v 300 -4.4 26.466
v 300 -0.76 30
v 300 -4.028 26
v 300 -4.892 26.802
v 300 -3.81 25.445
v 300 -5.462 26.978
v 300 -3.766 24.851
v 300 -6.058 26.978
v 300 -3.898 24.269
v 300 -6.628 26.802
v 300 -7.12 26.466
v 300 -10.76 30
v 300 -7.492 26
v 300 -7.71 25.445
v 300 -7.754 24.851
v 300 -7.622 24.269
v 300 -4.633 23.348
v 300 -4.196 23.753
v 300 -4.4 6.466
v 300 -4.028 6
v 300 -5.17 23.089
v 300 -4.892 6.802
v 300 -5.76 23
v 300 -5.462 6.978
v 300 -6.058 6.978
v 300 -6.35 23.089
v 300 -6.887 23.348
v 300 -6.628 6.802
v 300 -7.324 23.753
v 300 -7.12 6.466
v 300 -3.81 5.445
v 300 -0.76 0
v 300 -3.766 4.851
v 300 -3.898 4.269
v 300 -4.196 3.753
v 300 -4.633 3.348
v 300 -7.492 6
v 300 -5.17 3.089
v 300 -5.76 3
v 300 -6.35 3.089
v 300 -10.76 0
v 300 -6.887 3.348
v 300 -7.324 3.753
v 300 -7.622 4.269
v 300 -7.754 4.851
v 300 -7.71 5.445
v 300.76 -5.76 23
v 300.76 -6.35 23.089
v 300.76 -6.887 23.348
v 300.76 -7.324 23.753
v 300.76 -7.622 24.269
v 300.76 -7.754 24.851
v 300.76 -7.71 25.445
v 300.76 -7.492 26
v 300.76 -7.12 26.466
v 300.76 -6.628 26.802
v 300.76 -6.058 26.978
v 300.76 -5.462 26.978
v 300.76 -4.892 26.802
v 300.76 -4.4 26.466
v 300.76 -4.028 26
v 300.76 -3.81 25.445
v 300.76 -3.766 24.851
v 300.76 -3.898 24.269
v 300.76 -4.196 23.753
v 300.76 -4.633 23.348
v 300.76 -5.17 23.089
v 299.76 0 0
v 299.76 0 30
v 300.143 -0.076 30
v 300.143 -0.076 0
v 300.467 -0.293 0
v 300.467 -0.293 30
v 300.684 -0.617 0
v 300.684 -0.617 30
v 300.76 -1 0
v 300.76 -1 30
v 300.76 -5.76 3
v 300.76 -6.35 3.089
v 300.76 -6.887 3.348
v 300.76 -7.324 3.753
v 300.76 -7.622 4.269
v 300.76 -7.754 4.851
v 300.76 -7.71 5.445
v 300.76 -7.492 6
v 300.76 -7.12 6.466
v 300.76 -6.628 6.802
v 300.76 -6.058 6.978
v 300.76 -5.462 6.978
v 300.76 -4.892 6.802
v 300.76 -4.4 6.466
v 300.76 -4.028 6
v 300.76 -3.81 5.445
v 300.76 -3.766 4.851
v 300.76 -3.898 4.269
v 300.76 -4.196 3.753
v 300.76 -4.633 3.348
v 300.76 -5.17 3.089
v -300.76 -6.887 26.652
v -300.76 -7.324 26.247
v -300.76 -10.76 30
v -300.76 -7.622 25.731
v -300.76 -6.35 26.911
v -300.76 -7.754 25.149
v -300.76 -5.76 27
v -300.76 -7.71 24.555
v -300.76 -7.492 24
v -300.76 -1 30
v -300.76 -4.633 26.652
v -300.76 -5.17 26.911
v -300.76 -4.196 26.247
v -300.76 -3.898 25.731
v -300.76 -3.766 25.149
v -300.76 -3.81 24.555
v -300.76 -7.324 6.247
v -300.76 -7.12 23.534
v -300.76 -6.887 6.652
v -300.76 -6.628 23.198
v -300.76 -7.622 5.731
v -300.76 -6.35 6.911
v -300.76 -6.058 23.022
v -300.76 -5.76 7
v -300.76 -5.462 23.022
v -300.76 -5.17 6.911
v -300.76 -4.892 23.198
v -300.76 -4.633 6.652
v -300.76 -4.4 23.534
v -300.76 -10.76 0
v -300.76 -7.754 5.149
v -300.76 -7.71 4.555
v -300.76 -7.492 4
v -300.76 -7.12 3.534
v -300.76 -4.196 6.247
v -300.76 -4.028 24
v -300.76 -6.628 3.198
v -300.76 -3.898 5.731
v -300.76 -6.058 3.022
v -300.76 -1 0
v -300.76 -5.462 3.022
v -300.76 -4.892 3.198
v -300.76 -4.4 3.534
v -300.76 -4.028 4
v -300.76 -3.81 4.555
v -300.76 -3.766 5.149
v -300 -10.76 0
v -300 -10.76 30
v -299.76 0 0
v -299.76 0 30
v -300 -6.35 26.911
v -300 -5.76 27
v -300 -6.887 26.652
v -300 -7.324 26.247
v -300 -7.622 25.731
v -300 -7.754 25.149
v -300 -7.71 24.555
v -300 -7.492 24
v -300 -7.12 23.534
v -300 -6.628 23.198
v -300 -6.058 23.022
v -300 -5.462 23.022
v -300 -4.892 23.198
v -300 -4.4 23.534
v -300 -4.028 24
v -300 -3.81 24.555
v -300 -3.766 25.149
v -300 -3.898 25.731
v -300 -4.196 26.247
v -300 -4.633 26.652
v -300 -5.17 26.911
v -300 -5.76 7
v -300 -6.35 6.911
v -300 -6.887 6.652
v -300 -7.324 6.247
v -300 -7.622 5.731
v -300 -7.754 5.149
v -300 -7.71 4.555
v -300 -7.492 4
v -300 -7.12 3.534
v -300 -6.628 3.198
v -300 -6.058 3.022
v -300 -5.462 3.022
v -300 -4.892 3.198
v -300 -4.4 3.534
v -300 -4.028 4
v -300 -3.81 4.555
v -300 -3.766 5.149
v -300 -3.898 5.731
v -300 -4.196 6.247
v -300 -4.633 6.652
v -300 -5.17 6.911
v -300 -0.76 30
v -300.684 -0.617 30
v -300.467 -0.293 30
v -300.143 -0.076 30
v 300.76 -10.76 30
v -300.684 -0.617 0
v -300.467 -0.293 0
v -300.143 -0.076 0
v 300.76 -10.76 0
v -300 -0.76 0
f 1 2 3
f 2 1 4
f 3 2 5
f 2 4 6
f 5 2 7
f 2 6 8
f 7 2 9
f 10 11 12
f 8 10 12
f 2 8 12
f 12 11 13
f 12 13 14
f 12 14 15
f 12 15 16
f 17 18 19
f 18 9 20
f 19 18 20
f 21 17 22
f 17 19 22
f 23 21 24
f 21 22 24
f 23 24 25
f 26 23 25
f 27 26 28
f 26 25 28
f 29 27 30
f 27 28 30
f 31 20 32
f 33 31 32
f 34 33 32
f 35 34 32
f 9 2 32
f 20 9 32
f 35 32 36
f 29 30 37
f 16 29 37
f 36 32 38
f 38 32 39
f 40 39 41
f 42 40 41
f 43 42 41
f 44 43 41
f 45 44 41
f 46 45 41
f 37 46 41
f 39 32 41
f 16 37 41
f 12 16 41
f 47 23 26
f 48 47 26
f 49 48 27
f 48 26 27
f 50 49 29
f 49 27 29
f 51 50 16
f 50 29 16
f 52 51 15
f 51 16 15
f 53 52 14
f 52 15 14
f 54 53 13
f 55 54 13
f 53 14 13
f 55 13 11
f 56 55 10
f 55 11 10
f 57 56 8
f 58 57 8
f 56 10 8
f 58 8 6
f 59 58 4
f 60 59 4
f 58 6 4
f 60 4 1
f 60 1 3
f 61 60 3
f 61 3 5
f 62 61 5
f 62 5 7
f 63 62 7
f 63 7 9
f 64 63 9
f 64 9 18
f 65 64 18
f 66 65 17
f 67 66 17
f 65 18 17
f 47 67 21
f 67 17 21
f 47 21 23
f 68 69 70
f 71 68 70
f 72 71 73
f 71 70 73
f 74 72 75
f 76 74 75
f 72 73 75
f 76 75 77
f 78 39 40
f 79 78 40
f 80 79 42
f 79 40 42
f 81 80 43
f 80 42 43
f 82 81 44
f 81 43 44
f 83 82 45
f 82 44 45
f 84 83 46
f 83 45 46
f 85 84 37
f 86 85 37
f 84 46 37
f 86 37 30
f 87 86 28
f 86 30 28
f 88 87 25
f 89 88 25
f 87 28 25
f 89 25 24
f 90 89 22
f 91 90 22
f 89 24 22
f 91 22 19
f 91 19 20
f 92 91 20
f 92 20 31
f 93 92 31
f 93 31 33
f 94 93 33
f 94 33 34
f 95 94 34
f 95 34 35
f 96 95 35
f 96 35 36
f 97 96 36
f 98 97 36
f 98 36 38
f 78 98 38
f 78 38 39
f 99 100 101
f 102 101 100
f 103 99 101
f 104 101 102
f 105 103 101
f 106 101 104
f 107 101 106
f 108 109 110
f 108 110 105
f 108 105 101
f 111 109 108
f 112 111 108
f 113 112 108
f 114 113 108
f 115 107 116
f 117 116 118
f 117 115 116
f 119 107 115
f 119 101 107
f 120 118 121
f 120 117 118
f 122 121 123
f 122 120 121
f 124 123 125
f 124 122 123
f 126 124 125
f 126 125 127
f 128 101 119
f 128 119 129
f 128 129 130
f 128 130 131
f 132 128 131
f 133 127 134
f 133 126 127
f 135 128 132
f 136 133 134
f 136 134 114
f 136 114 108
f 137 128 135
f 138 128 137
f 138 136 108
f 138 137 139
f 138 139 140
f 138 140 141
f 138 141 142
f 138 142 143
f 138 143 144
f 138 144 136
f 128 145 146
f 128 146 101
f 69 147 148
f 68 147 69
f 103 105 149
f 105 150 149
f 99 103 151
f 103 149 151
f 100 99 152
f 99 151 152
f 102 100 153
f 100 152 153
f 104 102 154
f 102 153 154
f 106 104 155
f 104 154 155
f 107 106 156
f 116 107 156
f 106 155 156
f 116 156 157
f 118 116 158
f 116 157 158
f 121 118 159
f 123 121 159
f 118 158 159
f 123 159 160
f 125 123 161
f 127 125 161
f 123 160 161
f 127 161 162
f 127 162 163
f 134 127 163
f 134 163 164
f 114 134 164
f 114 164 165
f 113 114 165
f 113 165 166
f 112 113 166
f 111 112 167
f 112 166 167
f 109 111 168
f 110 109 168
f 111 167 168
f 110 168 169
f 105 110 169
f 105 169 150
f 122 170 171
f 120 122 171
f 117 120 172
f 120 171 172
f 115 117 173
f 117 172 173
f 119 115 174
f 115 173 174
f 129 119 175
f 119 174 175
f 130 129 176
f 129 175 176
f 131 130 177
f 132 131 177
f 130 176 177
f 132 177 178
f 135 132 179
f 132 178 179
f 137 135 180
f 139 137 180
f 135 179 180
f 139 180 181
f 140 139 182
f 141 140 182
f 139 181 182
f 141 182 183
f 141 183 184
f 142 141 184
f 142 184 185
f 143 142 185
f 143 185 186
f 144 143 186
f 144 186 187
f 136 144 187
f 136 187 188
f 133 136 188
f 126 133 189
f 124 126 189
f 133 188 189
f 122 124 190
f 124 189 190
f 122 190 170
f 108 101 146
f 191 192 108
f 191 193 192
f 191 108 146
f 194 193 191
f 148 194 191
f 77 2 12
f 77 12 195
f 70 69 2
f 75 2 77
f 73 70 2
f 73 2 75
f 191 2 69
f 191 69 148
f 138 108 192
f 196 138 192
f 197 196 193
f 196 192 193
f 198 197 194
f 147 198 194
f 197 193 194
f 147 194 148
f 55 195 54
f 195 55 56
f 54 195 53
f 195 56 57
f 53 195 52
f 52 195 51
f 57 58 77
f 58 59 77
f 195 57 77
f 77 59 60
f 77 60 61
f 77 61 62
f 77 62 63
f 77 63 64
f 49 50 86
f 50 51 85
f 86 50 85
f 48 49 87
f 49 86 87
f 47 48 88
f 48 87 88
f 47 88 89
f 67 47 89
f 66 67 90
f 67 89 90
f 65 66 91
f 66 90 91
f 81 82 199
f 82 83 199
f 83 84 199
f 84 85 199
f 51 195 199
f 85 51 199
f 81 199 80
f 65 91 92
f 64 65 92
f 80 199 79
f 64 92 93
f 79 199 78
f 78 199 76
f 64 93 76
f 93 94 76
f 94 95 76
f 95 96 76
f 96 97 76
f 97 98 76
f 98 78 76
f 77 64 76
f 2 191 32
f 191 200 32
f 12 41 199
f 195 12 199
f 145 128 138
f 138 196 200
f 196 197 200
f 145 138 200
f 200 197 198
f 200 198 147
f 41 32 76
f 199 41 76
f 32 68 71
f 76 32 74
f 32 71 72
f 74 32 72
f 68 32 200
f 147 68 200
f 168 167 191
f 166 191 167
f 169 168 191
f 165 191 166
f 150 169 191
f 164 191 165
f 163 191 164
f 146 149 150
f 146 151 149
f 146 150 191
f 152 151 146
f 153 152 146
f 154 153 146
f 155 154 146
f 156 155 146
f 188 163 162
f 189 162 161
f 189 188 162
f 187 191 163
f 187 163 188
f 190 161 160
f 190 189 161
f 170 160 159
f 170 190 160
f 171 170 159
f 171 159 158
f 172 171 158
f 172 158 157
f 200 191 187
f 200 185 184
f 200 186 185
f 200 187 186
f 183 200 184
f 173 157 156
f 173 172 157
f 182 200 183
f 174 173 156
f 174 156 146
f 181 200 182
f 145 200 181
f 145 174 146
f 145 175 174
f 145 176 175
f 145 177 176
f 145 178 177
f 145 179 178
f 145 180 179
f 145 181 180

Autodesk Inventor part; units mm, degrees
ref_plane "YZ Plane" through (0, 0, 0) normal (1, 0, 0) x (0, 1, 0)
sketch "Sketch1" plane through (0, 0, 0) normal (0, 0, 1) x (1, 0, 0)
  line L0 (-300, 0) -> (300, 0)
  line L1 (-300, -0.76) -> (300, -0.76)
  line L2 (-300, -0.76) -> (-300, -10.76)
  line L3 (-300, -10.76) -> (-300.76, -10.76)
  line L4 (-300.76, -10.76) -> (-300.76, 0)
  line L5 (-300.76, 0) -> (-300, 0)
  line L6 (300, -0.76) -> (300, -10.76)
  line L7 (300, -10.76) -> (300.76, -10.76)
  line L8 (300.76, -10.76) -> (300.76, 0)
  line L9 (300.76, 0) -> (300, 0)
  point P0 (0, 0)
  point P1 (0, 0)
  dimension "d0" = 600
  dimension "d2" = 0.76
  dimension "d3" = 10
  dimension "d4" = 0.76
  dimension "d5" = 300
  dimension "d6" = 600
  dimension "d7" = 10
  dimension "d8" = 0.76
extrude "Extrusion1" add sketch "Sketch1" along normal blind 30
fillet "Fillet1" radius 1 1 edges at (-300.76, 0, 15)
fillet "Fillet2" radius 1 1 edges at (300.76, 0, 15)
ref_plane "Work Plane1" through (300.76, -10.76, 30) normal (1, 0, 0) x (0, 0, -1)
sketch "Sketch2" plane through (300.76, -10.76, 30) normal (1, 0, 0) x (0, 0, -1)
  line L0 (0, 9.76) -> (30, 9.76) projected
  line L1 (0, 0) -> (0, 9.76) projected
  line L2 (30, 0) -> (0, 0) projected
  line L3 (30, 9.76) -> (30, 0) projected
  point P0 (30, 10.76)
  point P1 (5, 5)
  point P2 (25, 5)
  dimension "d14" = 5
  dimension "d15" = 5
  dimension "d16" = 5
  dimension "d17" = 5
hole "Hole1" at (300.76, -5.76, 25) at (300.76, -5.76, 5) direction (-1, 0, 0) diameter 4 depth 0.76 tip angle 118
ref_plane "Work Plane2" through (-300.76, -10.76, 0) normal (-1, 0, 0) x (0, 0, 1)
sketch "Sketch3" plane through (-300.76, -10.76, 0) normal (-1, 0, 0) x (0, 0, 1)
  line L0 (0, 0) -> (30, 0) projected
  line L1 (0, 0) -> (0, 9.76) projected
  line L2 (30, 9.76) -> (30, 0) projected
  point P0 (0, 10.76)
  point P1 (5, 5)
  point P2 (25, 5)
  dimension "d26" = 5
  dimension "d27" = 5
  dimension "d28" = 5
  dimension "d29" = 5
hole "Hole2" at (-300.76, -5.76, 5) at (-300.76, -5.76, 25) direction (1, 0, 0) diameter 4 depth 0.76 tip angle 118
equation "\"BendRadius\" = Thickness"
equation "\"BendReliefWidth\" = Thickness"
equation "\"BendReliefDepth\" = 0.5 * Thickness"
equation "\"CornerReliefSize\" = 4 * Thickness"
equation "\"MinimumRemnant\" = 2 * Thickness"
equation "\"TransitionRadius\" = BendRadius"
equation "\"JacobiRadiusSize\" = BendRadius"
equation "\"GapSize\" = Thickness"
equation "\"Thickness\" = 0.76"
properties part number "Fin" material "Stainless Steel"
